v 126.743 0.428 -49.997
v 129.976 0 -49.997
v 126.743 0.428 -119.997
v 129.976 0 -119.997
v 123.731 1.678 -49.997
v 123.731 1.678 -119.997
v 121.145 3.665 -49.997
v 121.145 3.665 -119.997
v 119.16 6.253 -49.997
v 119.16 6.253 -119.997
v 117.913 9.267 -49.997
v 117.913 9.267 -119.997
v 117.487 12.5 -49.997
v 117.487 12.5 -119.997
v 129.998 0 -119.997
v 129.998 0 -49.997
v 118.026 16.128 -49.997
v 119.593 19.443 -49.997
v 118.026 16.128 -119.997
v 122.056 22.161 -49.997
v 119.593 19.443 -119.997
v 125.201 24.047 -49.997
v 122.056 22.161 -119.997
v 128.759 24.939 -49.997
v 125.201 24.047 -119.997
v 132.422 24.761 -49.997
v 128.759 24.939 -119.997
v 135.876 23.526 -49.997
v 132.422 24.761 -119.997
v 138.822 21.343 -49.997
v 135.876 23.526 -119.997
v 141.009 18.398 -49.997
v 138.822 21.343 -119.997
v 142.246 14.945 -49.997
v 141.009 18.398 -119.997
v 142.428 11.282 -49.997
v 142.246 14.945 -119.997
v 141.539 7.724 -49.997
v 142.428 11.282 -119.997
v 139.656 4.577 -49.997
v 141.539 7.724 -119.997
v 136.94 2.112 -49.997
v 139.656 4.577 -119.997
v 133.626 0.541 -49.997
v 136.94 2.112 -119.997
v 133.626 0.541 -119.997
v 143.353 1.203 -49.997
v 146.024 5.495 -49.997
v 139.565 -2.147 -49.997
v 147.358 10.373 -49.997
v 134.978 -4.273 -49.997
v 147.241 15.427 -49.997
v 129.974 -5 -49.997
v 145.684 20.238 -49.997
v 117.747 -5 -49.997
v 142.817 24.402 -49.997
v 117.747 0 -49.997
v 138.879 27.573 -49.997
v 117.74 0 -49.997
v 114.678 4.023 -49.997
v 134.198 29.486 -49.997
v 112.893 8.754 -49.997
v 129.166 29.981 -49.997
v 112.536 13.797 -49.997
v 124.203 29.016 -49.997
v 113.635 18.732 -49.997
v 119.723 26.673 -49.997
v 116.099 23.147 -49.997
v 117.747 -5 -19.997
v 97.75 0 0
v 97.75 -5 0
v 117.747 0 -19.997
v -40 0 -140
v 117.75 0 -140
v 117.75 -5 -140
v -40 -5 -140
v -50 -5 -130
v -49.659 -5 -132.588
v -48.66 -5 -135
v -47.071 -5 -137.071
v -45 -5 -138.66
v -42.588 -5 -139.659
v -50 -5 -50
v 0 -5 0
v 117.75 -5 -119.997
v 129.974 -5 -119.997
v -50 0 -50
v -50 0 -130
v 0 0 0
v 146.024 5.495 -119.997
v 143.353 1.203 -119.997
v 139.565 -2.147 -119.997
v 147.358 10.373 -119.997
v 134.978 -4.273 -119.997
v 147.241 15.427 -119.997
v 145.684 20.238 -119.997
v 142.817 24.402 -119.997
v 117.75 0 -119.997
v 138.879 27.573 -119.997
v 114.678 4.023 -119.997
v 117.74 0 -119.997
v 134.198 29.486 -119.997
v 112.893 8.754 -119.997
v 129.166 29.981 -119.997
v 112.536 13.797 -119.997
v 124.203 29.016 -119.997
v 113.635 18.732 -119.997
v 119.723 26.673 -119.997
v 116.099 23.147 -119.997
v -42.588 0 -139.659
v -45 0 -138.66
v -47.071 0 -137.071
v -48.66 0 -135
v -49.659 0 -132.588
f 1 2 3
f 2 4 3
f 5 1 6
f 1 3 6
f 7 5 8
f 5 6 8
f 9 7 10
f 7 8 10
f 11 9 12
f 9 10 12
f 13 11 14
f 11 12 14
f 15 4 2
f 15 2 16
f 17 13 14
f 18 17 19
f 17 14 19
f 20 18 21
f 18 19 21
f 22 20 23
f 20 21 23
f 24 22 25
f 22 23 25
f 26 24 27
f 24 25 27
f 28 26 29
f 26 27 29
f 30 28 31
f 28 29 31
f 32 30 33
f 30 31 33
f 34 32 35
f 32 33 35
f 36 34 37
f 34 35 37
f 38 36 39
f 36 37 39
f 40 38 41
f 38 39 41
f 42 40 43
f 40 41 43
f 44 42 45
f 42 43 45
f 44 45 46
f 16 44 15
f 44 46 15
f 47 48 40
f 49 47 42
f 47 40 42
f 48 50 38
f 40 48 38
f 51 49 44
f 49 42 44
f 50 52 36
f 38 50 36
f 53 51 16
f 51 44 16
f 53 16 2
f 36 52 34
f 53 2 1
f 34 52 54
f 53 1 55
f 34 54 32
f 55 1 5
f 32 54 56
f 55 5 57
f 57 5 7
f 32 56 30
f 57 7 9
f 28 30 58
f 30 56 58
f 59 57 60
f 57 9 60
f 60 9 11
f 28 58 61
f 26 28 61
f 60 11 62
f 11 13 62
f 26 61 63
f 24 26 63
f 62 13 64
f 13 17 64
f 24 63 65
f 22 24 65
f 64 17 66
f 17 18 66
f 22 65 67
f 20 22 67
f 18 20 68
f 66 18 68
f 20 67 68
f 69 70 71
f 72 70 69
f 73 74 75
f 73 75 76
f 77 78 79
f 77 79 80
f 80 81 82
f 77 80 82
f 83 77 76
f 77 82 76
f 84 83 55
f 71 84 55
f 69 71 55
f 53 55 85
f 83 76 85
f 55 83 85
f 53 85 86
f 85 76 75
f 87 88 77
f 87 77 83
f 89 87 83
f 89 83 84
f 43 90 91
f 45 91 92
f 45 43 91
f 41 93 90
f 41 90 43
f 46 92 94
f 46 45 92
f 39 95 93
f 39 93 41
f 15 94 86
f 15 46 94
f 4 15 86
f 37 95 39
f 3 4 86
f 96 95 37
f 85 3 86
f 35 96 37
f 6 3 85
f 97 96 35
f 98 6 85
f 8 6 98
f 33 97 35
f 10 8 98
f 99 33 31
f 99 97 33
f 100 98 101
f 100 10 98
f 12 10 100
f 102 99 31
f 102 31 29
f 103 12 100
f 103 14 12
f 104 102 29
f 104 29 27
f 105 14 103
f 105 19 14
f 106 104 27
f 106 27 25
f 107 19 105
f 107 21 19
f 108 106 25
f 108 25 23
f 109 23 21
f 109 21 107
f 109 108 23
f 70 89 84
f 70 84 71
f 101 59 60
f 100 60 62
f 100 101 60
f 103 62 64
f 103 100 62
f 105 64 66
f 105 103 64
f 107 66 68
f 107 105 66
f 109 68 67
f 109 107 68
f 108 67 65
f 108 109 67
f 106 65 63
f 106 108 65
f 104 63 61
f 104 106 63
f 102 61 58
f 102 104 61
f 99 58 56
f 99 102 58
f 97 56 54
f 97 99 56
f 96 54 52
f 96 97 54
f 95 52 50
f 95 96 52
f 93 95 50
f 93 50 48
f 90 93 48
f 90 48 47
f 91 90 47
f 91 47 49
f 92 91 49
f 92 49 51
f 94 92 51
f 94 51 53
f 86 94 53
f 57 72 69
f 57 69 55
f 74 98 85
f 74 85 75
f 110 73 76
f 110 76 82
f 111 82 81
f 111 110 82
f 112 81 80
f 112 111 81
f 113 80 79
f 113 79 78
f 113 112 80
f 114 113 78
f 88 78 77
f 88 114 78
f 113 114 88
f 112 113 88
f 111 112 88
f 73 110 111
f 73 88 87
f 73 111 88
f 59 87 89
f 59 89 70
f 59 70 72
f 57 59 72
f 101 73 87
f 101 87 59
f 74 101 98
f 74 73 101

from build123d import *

# Parameters (mm, degrees)
BOSS_EXTRUDE1_DEPTH = 5
SKETCH2_R           = 17.5
SKETCH2_R_2         = 12.5
BOSS_EXTRUDE2_DEPTH = 70


with BuildPart() as part:
    # Sketch1 → Boss-Extrude1 (new body)
    with BuildSketch(Plane(origin=(0, 0, 0), x_dir=(1, 0, 0), z_dir=(0, 1, 0))):
        with BuildLine():
            Line((0, 0), (97.75, 0))
            Line((97.75, 0), (117.746979772, 19.996979772))
            Line((117.746979772, 19.996979772), (117.746979772, 49.996979772))
            Line((117.746979772, 49.996979772), (130.000479502, 49.996979772))
            Line((130.000479502, 49.996979772), (130.000479502, 119.996979772))
            Line((130.000479502, 119.996979772), (117.750479502, 119.996979772))
            Line((117.750479502, 119.996979772), (117.750479502, 139.999520498))
            Line((117.750479502, 139.999520498), (-39.999520498, 139.999520498))
            ThreePointArc((-39.999520498, 139.999520498), (-47.07058831, 137.07058831), (-49.999520498, 129.999520498))
            Line((-49.999520498, 129.999520498), (-49.999520498, 49.999520498))
            Line((-49.999520498, 49.999520498), (0, 0))
        make_face()
    extrude(amount=-BOSS_EXTRUDE1_DEPTH)

    # Sketch2 → Boss-Extrude2 (add)
    with BuildSketch(Plane(origin=(0, 0, -119.996979772), x_dir=(-1, 0, 0), z_dir=(0, 0, -1))):
        with Locations((-129.987472978, 12.499995167)):
            Circle(SKETCH2_R)
        with Locations((-129.987472978, 12.499995167)):
            Circle(SKETCH2_R_2, mode=Mode.SUBTRACT)
    extrude(amount=-BOSS_EXTRUDE2_DEPTH)


solid = part.part
